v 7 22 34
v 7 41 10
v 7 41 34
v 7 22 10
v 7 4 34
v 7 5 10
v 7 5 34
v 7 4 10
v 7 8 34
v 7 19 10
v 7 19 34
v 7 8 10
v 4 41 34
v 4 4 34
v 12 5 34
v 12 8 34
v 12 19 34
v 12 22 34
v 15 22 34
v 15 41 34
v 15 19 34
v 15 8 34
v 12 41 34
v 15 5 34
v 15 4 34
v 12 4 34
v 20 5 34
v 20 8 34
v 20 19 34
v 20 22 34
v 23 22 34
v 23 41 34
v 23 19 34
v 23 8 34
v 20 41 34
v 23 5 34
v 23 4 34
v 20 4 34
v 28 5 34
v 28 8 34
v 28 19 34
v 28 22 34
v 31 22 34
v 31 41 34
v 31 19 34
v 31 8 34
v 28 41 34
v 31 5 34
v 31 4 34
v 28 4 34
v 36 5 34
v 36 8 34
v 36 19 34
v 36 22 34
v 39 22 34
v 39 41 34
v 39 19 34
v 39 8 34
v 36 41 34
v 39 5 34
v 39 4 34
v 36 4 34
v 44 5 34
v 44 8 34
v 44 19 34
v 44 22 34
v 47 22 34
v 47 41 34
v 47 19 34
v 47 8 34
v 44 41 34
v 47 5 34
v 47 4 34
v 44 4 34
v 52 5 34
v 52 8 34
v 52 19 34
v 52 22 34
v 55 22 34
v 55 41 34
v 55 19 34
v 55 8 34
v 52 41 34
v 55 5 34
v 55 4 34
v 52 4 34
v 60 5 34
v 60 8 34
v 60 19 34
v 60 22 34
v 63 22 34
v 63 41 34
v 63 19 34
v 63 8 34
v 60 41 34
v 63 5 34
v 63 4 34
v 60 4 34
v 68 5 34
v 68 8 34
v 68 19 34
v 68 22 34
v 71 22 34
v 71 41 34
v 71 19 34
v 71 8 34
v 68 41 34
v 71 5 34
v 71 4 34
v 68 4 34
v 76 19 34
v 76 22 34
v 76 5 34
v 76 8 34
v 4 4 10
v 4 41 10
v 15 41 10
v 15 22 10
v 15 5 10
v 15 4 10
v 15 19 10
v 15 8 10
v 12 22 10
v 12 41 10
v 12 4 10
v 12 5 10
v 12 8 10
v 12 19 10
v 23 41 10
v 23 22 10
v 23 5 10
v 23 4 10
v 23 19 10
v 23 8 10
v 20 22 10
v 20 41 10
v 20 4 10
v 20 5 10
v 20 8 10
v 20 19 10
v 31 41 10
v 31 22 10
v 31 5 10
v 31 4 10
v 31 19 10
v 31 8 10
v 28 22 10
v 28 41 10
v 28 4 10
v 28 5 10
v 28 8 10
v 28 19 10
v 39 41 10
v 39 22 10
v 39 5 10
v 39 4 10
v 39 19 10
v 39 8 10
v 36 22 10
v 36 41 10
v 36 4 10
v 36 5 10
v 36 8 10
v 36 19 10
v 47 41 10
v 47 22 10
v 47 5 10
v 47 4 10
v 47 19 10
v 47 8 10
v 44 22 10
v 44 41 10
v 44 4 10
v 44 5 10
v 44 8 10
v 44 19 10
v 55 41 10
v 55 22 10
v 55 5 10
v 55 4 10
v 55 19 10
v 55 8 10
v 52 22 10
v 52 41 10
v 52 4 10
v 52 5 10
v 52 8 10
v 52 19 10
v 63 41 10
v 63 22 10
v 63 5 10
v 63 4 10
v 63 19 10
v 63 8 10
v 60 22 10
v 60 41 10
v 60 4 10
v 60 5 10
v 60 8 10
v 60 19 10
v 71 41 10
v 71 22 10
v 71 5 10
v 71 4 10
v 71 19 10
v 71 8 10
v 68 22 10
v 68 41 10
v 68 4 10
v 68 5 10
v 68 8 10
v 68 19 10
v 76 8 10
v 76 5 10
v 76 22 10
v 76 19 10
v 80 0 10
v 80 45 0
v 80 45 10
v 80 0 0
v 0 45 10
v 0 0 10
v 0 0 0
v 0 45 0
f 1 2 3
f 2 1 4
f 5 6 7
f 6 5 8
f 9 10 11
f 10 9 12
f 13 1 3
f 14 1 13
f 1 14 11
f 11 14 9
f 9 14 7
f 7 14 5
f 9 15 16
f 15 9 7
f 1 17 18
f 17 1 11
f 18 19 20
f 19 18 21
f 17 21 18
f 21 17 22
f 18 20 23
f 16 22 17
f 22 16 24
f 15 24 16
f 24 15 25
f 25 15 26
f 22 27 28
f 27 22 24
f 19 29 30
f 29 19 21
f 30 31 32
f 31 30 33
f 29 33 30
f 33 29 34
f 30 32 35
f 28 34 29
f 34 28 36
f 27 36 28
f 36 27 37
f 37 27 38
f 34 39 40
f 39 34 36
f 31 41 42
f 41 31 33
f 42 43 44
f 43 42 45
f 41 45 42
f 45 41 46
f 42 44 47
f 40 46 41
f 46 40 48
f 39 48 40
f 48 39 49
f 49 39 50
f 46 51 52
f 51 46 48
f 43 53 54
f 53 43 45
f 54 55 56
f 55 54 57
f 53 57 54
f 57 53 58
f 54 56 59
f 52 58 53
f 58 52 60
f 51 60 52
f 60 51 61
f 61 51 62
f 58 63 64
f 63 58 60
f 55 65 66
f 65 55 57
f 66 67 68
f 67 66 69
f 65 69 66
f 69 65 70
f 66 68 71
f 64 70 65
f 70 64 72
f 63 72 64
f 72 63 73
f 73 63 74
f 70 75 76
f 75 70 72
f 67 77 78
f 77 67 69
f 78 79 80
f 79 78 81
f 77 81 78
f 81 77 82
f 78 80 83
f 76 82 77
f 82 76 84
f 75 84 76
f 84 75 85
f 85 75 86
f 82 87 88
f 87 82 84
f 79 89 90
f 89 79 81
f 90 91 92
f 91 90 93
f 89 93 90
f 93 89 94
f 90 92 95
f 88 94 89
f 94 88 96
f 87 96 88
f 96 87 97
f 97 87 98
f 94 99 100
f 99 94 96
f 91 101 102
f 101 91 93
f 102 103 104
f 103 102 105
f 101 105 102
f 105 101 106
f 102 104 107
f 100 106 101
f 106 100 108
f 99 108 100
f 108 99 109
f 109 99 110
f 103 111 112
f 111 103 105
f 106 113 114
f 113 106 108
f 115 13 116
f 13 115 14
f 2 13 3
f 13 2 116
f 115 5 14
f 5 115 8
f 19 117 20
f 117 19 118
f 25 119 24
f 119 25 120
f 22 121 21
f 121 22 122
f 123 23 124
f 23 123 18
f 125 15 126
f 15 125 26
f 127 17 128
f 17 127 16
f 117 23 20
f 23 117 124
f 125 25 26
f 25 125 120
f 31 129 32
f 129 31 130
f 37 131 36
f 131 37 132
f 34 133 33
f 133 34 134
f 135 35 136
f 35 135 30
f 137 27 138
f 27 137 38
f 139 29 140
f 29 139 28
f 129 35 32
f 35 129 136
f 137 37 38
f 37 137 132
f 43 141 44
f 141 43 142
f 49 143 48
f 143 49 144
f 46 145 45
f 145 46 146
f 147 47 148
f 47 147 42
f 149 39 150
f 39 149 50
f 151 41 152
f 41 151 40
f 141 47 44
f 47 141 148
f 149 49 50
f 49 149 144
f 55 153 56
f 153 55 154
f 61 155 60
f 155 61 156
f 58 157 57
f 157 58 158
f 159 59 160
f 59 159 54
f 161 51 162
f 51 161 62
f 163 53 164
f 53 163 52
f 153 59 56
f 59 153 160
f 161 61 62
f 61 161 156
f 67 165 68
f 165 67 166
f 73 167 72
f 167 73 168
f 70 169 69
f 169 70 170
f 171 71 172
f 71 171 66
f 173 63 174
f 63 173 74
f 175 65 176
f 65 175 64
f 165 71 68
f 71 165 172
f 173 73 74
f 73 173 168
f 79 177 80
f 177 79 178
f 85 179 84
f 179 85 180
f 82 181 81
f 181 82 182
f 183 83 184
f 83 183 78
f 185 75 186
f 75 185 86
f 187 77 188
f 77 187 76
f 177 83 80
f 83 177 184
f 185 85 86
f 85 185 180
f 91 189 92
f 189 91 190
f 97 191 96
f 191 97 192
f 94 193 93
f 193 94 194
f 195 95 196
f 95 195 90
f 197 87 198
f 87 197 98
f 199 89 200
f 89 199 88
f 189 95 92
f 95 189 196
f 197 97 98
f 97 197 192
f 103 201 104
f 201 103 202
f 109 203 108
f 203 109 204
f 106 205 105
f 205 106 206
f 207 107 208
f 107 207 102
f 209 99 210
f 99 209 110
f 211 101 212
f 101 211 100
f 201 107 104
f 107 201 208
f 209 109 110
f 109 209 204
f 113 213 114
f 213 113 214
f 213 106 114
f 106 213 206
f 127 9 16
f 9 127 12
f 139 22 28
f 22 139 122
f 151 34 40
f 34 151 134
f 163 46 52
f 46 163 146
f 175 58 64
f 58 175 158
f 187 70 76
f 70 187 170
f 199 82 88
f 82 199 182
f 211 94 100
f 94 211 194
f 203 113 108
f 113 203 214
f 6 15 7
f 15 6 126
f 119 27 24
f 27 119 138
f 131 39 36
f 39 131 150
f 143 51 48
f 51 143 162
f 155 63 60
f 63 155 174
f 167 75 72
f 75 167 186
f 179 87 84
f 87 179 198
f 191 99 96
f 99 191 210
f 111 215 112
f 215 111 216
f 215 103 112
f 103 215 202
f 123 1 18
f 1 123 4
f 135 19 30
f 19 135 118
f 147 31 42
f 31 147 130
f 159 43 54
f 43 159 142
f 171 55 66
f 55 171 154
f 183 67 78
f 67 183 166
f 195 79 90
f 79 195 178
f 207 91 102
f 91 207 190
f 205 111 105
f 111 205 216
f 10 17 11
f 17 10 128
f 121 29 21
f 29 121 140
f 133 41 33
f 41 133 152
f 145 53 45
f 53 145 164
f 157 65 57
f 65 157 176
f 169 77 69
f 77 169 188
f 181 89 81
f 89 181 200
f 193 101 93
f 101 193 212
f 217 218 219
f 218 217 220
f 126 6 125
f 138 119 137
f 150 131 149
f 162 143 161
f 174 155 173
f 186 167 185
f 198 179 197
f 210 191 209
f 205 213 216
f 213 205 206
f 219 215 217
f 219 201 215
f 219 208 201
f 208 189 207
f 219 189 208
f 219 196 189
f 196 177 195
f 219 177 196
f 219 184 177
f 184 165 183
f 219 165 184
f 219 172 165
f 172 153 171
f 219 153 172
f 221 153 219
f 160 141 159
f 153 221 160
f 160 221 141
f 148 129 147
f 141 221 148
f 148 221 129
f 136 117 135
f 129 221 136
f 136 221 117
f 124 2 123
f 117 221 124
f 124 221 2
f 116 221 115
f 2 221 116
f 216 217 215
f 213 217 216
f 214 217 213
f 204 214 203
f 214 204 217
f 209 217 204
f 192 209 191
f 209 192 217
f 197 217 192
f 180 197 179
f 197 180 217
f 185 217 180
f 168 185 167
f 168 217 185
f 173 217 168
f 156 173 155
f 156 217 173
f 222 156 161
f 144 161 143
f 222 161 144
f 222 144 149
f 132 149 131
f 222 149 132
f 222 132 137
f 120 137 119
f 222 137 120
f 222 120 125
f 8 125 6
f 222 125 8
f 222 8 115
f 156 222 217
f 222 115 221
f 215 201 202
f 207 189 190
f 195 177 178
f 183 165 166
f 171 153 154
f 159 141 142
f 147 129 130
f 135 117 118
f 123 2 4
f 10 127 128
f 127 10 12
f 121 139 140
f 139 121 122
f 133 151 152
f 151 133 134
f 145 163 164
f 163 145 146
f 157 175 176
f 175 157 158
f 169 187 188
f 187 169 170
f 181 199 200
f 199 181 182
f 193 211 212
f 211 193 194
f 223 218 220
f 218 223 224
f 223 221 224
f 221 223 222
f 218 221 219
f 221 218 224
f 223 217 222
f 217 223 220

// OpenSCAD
$fn = 32;

// ----------------------------------------------------------------------
// Heatsink: cross fin block
// ----------------------------------------------------------------------

// --- parameters (mm) ---
base_l = 80;              // base length, X
base_w = 45;              // base width, Y
base_t = 10;              // base plate thickness
fin_h = 25;               // fin height above the base
fin_t = 3;                // fin thickness
edge = 4;                 // margin from the base ends
pitch = 8;                // fin pitch
rib_pitch = 14;           // cross rib pitch

n_fins = floor((base_l - 2 * edge - fin_t) / pitch) + 1;  // fin count
total_h = base_t + fin_h - 1;  // overall height
n_ribs = floor((base_w - 2 * edge) / rib_pitch);  // rib count

union() {
  cube([base_l, base_w, base_t]);
  for (i = [0 : n_fins - 1])
    translate([edge + i * pitch, edge, base_t - 1])
      cube([fin_t, base_w - 2 * edge, fin_h]);
  for (i = [0 : n_ribs - 1])
    translate([edge, edge + 1 + i * rib_pitch, base_t - 1])
      cube([base_l - 2 * edge, fin_t, fin_h]);
}
